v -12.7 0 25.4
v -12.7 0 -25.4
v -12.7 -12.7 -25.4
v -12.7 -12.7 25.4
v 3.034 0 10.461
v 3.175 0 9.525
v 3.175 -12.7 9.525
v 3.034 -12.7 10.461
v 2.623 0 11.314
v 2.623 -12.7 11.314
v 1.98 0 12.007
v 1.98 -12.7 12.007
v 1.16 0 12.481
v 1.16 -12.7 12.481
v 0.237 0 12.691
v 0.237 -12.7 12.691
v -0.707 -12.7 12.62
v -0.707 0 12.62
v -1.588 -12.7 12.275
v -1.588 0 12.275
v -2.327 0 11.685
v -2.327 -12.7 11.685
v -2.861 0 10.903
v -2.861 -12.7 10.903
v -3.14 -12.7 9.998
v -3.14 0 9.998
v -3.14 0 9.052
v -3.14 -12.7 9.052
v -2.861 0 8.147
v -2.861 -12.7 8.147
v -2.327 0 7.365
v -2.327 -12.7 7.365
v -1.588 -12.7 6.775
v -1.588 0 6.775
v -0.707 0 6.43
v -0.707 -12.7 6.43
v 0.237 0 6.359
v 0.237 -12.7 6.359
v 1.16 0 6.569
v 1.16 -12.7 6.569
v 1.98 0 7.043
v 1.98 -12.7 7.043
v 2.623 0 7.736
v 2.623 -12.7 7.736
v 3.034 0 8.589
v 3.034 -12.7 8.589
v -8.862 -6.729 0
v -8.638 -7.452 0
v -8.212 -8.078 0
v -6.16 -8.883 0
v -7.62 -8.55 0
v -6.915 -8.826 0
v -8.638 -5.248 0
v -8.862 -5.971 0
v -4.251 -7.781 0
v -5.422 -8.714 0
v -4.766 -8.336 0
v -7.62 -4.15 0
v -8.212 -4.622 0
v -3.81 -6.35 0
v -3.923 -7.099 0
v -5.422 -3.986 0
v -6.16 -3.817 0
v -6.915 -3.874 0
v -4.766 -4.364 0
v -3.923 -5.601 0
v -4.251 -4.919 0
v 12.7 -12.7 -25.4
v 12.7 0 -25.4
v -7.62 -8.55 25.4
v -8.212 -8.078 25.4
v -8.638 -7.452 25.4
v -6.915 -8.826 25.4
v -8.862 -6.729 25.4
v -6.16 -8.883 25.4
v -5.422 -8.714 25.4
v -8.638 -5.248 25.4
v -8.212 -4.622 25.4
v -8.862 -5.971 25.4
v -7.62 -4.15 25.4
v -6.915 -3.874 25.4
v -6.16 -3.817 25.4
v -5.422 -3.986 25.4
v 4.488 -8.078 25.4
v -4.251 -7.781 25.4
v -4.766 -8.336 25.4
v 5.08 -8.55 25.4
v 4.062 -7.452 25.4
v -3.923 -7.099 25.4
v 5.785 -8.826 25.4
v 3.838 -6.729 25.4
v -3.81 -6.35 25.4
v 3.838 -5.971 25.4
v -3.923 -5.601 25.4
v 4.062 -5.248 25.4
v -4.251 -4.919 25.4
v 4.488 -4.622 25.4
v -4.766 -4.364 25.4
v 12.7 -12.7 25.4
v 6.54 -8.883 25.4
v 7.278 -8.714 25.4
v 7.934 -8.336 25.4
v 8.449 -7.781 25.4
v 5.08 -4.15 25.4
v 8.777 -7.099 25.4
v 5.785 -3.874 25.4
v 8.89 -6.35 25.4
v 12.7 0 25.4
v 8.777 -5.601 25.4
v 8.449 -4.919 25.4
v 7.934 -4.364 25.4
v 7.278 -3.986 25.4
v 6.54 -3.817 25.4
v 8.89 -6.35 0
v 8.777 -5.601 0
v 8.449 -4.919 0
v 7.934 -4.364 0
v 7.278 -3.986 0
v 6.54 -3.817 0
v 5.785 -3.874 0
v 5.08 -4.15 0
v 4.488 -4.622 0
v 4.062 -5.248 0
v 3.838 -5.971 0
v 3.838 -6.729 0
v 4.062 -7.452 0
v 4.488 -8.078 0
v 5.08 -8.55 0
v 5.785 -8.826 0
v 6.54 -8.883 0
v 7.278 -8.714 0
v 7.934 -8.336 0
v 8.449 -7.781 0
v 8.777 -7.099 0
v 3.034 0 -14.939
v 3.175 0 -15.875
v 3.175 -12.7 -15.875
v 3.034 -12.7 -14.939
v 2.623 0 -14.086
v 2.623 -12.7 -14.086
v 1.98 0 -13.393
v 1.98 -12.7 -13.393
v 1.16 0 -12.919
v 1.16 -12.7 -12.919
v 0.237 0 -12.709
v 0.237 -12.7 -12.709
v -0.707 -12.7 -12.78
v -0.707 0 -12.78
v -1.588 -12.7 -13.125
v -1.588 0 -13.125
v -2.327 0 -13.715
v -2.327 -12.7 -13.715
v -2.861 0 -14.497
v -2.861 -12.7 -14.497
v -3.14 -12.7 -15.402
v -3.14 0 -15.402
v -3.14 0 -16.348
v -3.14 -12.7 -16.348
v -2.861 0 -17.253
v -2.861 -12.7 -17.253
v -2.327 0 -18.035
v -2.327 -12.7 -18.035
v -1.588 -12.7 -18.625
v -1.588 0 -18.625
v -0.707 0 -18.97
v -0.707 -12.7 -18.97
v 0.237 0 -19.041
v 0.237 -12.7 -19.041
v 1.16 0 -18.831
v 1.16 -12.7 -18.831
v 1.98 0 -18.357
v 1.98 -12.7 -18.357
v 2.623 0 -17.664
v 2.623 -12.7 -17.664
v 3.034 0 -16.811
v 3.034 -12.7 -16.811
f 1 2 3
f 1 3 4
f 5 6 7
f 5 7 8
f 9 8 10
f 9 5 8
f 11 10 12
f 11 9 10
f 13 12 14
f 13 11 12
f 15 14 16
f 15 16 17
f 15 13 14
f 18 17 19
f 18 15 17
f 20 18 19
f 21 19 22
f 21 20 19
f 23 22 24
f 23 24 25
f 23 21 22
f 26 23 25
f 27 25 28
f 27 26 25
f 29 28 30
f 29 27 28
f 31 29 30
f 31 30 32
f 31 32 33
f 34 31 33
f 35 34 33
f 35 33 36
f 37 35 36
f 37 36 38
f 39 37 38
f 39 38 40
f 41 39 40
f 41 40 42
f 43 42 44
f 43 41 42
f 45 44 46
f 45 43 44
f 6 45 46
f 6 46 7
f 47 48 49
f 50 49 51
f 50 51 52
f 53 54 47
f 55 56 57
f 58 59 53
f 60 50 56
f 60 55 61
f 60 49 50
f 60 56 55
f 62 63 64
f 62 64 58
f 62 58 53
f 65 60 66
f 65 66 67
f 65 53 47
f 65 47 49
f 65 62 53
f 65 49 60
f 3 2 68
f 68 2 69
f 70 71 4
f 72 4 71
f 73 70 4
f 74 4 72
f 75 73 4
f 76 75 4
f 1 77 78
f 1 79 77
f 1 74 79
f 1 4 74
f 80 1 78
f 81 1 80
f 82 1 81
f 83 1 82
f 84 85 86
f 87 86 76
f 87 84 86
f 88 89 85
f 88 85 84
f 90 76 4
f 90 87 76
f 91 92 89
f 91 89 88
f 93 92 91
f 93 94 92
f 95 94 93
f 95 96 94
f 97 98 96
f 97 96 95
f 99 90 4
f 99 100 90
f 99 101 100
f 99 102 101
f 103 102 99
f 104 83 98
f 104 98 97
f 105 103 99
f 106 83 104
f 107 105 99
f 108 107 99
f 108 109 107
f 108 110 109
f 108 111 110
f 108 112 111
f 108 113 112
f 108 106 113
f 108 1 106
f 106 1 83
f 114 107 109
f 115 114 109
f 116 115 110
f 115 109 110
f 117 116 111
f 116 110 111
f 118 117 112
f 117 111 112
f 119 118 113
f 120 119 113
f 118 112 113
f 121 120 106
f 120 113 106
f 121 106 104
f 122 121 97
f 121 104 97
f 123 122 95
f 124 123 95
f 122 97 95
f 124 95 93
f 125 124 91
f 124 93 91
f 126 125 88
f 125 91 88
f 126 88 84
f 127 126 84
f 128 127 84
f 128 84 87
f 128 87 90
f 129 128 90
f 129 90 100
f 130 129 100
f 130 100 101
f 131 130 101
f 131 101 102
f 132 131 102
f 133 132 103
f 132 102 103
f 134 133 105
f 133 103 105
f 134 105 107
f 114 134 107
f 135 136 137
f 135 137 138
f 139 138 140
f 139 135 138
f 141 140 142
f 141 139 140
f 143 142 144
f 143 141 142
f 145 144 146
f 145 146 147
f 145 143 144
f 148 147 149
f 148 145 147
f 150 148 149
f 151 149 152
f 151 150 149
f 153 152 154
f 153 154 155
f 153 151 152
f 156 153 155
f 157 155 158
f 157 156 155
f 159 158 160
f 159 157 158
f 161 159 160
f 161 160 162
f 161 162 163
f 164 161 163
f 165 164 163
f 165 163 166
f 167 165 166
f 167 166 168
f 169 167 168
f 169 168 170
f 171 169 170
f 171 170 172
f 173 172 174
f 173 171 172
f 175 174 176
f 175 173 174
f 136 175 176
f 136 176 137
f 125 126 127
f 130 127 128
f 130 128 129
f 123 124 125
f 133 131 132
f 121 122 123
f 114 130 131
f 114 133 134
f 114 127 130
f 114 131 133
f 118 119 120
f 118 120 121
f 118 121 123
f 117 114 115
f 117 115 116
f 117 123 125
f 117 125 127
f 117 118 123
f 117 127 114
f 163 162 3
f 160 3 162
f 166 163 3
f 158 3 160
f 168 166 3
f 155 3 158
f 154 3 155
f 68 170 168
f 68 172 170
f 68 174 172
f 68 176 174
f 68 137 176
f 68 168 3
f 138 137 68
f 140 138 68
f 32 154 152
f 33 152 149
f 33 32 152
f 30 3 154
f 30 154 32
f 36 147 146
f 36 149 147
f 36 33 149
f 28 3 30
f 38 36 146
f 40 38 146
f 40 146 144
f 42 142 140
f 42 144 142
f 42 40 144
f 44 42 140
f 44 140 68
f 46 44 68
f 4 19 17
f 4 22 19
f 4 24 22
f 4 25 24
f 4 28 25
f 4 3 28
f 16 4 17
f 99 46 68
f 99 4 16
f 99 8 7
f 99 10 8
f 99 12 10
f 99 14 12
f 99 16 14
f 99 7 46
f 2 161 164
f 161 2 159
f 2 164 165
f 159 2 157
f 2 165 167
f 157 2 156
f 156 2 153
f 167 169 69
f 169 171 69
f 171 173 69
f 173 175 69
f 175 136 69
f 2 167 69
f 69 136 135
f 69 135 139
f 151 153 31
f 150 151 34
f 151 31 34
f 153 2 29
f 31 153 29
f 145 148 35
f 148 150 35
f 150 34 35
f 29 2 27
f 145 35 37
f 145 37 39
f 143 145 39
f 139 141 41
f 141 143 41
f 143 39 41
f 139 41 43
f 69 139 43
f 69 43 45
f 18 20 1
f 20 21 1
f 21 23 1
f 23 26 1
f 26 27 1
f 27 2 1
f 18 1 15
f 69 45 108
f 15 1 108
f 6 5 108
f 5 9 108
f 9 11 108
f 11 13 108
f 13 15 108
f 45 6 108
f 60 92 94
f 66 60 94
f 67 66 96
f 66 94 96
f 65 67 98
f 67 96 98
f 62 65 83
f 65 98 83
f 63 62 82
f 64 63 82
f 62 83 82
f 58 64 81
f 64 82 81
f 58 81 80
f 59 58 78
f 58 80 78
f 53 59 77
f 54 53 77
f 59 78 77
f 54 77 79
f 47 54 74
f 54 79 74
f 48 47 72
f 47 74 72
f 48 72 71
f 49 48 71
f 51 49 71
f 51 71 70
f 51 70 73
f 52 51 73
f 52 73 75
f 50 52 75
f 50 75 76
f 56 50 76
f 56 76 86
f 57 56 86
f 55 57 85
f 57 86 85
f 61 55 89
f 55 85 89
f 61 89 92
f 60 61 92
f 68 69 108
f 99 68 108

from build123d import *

# Parameters (mm, degrees)
F0_W     = 25.4
F0_H     = 50.8
F0_R     = 3.175
F1_DEPTH = 12.7
F2_R     = 2.54
F3_DEPTH = 25.4


with BuildPart() as f1:
    # F0 (on Front) → F1 (new body)
    with BuildSketch(Plane.XZ):
        Rectangle(F0_W, F0_H)
        with Locations((0, -15.875)):
            Circle(F0_R, mode=Mode.SUBTRACT)
        with Locations((0, 9.525)):
            Circle(F0_R, mode=Mode.SUBTRACT)
    extrude(amount=F1_DEPTH)

    # F2 (on face) → F3 (cut)
    with BuildSketch(Plane.XY.offset(25.4)):
        with Locations((-6.35, -6.35)):
            Circle(F2_R)
        with Locations((6.35, -6.35)):
            Circle(F2_R)
    extrude(amount=-F3_DEPTH, mode=Mode.SUBTRACT)


solid = f1.part
